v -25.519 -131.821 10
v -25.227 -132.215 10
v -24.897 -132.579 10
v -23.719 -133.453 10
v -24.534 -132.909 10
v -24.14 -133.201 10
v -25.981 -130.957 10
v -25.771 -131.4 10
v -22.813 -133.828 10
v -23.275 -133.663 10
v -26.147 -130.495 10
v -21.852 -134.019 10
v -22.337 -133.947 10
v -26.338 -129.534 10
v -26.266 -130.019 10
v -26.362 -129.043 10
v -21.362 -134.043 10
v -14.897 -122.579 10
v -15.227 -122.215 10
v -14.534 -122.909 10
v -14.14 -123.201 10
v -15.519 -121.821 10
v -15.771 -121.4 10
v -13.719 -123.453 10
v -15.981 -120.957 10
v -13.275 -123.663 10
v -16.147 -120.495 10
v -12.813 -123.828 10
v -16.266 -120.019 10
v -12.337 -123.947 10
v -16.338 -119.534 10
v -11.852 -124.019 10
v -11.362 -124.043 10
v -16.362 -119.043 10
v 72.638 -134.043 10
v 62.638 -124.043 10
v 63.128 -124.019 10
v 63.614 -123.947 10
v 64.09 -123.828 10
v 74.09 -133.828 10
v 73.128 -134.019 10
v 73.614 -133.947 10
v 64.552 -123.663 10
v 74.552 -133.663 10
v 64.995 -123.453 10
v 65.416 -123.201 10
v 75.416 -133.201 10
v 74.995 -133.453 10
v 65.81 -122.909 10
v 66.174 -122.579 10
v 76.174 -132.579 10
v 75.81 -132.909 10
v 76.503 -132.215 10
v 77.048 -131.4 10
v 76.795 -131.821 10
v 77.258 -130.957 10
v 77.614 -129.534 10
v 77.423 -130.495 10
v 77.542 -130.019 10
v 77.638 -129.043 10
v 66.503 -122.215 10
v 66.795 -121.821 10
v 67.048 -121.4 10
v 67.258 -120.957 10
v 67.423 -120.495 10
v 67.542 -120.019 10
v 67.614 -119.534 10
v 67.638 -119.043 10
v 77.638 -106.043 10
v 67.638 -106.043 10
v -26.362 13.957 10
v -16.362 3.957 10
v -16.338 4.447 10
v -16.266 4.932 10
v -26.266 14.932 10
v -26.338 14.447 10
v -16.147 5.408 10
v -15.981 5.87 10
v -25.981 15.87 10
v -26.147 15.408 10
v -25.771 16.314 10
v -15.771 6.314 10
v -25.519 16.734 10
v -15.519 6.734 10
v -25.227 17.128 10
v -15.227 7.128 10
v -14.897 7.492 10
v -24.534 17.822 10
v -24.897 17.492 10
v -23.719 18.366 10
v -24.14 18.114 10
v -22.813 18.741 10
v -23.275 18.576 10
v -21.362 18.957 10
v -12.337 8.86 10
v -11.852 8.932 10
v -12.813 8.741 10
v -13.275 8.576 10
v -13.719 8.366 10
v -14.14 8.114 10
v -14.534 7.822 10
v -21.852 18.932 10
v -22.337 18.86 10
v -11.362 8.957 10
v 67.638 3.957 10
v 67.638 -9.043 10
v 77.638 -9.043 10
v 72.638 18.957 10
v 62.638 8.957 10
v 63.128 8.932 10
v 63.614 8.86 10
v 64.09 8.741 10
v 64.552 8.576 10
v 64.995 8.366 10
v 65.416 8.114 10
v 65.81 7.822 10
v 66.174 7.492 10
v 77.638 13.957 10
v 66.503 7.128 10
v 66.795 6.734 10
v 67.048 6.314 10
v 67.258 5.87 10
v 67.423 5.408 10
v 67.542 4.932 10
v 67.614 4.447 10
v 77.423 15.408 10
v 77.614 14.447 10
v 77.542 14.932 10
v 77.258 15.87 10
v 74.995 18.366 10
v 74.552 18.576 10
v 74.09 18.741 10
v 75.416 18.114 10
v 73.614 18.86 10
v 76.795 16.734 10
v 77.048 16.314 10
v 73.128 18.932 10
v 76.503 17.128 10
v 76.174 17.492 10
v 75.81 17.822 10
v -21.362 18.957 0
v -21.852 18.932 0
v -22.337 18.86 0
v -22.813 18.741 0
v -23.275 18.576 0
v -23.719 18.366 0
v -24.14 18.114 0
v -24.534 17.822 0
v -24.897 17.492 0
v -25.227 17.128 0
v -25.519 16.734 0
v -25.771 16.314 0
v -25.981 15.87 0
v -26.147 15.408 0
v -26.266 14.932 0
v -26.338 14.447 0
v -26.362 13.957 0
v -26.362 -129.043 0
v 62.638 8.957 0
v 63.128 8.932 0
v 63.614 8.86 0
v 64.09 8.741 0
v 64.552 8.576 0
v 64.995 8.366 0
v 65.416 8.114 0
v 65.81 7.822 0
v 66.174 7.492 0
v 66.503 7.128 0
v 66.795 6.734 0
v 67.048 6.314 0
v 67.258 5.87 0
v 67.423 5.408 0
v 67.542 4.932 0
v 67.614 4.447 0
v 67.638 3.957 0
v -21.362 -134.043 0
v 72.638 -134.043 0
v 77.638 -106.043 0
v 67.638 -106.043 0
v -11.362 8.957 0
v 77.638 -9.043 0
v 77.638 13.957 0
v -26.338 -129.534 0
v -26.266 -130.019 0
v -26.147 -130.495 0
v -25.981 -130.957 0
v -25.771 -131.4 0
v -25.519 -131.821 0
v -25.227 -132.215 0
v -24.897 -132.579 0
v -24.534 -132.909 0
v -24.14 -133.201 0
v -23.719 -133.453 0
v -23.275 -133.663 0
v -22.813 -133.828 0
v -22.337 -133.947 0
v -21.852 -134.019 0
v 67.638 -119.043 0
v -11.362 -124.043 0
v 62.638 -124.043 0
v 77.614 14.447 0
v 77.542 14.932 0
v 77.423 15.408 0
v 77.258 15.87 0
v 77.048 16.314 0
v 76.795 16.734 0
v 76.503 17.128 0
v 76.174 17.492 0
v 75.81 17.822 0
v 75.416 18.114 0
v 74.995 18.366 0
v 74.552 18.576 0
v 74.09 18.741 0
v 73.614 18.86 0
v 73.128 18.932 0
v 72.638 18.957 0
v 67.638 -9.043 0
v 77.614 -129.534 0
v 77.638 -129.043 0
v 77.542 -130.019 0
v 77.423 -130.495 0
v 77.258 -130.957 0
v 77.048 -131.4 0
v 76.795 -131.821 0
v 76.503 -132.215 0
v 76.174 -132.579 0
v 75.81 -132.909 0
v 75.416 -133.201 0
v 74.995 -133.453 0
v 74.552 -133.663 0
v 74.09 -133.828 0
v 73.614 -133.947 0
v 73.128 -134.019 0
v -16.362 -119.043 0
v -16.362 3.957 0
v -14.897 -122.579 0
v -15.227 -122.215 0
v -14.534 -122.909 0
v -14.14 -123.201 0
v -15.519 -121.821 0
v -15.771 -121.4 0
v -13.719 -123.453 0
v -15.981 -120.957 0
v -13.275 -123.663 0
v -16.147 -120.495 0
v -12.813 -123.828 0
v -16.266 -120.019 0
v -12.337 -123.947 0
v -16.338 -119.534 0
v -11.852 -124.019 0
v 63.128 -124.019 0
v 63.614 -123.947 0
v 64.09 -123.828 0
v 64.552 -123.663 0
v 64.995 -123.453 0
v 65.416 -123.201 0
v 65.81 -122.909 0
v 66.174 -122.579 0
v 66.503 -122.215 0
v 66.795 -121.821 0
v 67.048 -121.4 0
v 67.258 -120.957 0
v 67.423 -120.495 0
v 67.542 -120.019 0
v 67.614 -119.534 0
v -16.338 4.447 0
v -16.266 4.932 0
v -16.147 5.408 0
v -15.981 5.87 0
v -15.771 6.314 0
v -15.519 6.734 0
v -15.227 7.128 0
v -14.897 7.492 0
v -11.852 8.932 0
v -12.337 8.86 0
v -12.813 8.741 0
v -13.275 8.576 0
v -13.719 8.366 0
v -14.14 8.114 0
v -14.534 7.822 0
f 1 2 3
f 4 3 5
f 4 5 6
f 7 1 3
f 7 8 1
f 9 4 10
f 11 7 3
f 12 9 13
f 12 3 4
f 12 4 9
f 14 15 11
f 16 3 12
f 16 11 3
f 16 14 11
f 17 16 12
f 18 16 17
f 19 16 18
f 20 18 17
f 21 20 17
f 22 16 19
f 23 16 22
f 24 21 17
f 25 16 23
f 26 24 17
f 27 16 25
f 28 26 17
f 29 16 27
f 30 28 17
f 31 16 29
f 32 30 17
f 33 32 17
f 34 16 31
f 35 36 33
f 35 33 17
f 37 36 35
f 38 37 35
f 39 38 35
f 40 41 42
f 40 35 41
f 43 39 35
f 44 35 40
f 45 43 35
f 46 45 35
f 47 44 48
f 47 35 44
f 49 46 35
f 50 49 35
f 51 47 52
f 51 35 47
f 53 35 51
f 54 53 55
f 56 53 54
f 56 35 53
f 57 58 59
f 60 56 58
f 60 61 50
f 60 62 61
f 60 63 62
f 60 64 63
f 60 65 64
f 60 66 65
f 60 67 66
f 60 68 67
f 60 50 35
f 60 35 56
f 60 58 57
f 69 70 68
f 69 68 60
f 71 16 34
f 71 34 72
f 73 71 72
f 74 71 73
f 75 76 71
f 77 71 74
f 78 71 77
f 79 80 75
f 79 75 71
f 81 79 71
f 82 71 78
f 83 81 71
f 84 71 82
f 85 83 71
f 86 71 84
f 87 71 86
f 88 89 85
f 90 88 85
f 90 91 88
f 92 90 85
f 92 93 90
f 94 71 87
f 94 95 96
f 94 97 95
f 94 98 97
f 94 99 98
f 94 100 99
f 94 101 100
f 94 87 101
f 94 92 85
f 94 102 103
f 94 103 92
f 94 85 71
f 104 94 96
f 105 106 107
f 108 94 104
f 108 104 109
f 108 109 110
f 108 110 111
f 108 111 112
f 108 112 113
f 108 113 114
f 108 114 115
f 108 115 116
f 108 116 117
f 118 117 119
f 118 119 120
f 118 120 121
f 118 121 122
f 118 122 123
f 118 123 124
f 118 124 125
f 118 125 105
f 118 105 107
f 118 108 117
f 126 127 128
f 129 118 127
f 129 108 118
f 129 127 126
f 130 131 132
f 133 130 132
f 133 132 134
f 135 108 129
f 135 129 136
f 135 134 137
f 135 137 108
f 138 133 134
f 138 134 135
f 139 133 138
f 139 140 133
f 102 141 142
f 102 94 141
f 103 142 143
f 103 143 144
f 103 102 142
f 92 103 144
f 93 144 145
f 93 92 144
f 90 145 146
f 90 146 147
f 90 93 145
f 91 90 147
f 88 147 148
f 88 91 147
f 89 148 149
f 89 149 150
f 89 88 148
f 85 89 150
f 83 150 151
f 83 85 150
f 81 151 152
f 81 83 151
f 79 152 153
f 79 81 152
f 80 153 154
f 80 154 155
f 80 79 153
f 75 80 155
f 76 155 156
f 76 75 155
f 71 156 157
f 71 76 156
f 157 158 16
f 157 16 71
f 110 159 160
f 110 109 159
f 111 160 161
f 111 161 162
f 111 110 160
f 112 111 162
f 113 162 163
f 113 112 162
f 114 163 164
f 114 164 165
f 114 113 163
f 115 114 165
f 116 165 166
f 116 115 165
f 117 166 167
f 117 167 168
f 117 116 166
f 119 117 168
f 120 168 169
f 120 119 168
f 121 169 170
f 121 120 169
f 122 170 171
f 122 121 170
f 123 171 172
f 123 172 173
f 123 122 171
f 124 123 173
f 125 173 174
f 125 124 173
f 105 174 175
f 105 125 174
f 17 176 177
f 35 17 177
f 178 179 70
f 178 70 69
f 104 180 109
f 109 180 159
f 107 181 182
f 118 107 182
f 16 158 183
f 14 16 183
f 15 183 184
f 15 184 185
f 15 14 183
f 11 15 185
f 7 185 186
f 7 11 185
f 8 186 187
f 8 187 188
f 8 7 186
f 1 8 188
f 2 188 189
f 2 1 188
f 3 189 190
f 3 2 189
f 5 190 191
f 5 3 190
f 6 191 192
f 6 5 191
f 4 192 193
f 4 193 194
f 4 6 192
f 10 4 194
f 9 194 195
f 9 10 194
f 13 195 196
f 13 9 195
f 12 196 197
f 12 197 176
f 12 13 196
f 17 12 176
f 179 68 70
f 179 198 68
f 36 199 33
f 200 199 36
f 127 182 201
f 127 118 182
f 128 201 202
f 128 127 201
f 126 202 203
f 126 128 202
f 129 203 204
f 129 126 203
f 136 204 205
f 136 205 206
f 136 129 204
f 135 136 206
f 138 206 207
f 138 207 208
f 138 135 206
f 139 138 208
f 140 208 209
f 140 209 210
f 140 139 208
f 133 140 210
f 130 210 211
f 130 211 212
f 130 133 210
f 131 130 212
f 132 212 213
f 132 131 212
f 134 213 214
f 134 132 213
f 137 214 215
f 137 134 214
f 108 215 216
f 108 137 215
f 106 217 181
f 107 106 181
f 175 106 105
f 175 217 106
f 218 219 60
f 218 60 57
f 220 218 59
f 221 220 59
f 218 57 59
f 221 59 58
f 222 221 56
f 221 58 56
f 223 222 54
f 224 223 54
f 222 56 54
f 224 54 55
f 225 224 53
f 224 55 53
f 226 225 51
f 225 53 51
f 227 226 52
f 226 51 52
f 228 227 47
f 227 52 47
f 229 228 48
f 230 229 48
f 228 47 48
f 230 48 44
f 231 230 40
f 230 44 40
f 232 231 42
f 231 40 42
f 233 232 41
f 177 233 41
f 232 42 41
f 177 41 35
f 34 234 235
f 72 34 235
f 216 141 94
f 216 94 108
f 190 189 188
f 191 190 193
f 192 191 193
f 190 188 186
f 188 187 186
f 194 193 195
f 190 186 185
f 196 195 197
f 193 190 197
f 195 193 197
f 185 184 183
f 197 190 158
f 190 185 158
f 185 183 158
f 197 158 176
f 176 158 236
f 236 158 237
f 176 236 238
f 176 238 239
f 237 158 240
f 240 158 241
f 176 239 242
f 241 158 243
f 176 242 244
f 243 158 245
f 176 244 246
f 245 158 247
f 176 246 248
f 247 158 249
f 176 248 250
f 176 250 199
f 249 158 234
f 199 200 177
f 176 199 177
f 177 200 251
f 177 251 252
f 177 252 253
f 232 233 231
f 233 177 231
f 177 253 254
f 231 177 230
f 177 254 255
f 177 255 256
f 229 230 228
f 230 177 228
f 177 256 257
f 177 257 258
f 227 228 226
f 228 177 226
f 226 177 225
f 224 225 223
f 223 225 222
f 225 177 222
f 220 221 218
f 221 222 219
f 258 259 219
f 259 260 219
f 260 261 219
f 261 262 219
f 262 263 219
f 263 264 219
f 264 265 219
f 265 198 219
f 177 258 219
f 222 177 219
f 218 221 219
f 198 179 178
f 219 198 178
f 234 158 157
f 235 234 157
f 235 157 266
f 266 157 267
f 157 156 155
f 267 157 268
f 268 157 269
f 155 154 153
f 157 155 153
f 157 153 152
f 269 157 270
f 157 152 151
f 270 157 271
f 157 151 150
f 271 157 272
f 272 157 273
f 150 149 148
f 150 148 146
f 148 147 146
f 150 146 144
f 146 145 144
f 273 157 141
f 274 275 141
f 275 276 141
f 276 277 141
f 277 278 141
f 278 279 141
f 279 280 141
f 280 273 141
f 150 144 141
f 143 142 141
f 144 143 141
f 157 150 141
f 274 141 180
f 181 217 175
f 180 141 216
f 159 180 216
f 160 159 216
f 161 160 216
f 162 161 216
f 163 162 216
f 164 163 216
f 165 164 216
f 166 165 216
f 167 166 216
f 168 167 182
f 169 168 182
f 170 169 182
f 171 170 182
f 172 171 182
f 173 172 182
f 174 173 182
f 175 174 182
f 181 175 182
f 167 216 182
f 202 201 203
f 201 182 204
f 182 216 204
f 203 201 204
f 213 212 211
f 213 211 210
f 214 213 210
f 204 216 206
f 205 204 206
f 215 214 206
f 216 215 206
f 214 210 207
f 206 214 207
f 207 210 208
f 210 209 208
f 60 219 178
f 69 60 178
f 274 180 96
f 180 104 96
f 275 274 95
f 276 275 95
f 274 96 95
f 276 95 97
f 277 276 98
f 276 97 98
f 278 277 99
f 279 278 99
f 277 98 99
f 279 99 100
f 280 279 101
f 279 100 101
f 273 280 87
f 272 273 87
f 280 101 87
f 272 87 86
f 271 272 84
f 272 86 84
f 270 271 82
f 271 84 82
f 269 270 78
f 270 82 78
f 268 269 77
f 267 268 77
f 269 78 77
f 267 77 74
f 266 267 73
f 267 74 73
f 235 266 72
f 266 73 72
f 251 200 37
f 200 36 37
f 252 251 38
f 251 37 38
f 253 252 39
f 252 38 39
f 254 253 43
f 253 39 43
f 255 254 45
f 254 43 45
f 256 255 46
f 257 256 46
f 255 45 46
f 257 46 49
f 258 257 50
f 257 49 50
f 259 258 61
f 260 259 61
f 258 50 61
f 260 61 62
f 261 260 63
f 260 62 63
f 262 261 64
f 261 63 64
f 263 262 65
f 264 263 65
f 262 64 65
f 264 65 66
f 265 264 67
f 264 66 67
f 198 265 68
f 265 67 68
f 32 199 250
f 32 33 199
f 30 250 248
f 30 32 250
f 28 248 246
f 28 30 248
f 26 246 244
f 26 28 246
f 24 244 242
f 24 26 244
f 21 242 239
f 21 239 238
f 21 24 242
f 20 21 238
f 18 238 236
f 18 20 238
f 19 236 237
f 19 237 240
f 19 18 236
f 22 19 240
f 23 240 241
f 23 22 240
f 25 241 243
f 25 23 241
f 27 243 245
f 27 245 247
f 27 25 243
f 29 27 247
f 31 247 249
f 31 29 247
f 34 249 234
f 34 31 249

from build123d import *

# Parameters (mm, degrees)
SKETCH1_W               = 104
SKETCH1_H               = 153
BOSS_EXTRUDE1_DEPTH     = 10
CUT_EXTRUDE1_DEPTH      = 156.226704492
CUT_EXTRUDE1_DEPTH_BACK = 156.226704492
SKETCH2_W               = 84
SKETCH2_H               = 133
CUT_EXTRUDE3_DEPTH      = 156.226704492
CUT_EXTRUDE3_DEPTH_BACK = 156.226704492
SKETCH3_W               = 10
SKETCH3_H               = 97
FILLET9_R               = 5
FILLET10_R              = 5
FILLET11_R              = 5
FILLET12_R              = 5


with BuildPart() as part:
    # Sketch1 → Boss-Extrude1 (new body)
    with BuildSketch(Plane.XY):
        with Locations((25.638107417, -57.543478261)):
            Rectangle(SKETCH1_W, SKETCH1_H)
    extrude(amount=BOSS_EXTRUDE1_DEPTH)

    # Sketch2 → Cut-Extrude1 (cut, two sides: drawn at the far end of the back side and taken through both)
    with BuildSketch(Plane.XY.offset(10).offset(-CUT_EXTRUDE1_DEPTH_BACK)):
        with Locations((25.638107417, -57.543478261)):
            Rectangle(SKETCH2_W, SKETCH2_H)
    extrude(amount=CUT_EXTRUDE1_DEPTH + CUT_EXTRUDE1_DEPTH_BACK, mode=Mode.SUBTRACT)

    # Sketch3 → Cut-Extrude3 (cut, two sides: drawn at the far end of the back side and taken through both)
    with BuildSketch(Plane.XY.offset(10).offset(-CUT_EXTRUDE3_DEPTH_BACK)):
        with Locations((72.638107417, -57.543478261)):
            Rectangle(SKETCH3_W, SKETCH3_H)
    extrude(amount=CUT_EXTRUDE3_DEPTH + CUT_EXTRUDE3_DEPTH_BACK, mode=Mode.SUBTRACT)

    # Fillet9
    fillet9_edges = [part.edges().sort_by_distance(p)[0] for p in [
        (-16.361892583, 8.956521739, 5),
    ]]
    fillet(fillet9_edges, radius=FILLET9_R)

    # Fillet10
    fillet10_edges = [part.edges().sort_by_distance(p)[0] for p in [
        (67.638107417, 8.956521739, 5),
        (-26.361892583, 18.956521739, 5),
    ]]
    fillet(fillet10_edges, radius=FILLET10_R)

    # Fillet11
    fillet11_edges = [part.edges().sort_by_distance(p)[0] for p in [
        (67.638107417, -124.043478261, 5),
        (77.638107417, 18.956521739, 5),
        (-26.361892583, -134.043478261, 5),
    ]]
    fillet(fillet11_edges, radius=FILLET11_R)

    # Fillet12
    fillet12_edges = [part.edges().sort_by_distance(p)[0] for p in [
        (-16.361892583, -124.043478261, 5),
        (77.638107417, -134.043478261, 5),
    ]]
    fillet(fillet12_edges, radius=FILLET12_R)


solid = part.part
